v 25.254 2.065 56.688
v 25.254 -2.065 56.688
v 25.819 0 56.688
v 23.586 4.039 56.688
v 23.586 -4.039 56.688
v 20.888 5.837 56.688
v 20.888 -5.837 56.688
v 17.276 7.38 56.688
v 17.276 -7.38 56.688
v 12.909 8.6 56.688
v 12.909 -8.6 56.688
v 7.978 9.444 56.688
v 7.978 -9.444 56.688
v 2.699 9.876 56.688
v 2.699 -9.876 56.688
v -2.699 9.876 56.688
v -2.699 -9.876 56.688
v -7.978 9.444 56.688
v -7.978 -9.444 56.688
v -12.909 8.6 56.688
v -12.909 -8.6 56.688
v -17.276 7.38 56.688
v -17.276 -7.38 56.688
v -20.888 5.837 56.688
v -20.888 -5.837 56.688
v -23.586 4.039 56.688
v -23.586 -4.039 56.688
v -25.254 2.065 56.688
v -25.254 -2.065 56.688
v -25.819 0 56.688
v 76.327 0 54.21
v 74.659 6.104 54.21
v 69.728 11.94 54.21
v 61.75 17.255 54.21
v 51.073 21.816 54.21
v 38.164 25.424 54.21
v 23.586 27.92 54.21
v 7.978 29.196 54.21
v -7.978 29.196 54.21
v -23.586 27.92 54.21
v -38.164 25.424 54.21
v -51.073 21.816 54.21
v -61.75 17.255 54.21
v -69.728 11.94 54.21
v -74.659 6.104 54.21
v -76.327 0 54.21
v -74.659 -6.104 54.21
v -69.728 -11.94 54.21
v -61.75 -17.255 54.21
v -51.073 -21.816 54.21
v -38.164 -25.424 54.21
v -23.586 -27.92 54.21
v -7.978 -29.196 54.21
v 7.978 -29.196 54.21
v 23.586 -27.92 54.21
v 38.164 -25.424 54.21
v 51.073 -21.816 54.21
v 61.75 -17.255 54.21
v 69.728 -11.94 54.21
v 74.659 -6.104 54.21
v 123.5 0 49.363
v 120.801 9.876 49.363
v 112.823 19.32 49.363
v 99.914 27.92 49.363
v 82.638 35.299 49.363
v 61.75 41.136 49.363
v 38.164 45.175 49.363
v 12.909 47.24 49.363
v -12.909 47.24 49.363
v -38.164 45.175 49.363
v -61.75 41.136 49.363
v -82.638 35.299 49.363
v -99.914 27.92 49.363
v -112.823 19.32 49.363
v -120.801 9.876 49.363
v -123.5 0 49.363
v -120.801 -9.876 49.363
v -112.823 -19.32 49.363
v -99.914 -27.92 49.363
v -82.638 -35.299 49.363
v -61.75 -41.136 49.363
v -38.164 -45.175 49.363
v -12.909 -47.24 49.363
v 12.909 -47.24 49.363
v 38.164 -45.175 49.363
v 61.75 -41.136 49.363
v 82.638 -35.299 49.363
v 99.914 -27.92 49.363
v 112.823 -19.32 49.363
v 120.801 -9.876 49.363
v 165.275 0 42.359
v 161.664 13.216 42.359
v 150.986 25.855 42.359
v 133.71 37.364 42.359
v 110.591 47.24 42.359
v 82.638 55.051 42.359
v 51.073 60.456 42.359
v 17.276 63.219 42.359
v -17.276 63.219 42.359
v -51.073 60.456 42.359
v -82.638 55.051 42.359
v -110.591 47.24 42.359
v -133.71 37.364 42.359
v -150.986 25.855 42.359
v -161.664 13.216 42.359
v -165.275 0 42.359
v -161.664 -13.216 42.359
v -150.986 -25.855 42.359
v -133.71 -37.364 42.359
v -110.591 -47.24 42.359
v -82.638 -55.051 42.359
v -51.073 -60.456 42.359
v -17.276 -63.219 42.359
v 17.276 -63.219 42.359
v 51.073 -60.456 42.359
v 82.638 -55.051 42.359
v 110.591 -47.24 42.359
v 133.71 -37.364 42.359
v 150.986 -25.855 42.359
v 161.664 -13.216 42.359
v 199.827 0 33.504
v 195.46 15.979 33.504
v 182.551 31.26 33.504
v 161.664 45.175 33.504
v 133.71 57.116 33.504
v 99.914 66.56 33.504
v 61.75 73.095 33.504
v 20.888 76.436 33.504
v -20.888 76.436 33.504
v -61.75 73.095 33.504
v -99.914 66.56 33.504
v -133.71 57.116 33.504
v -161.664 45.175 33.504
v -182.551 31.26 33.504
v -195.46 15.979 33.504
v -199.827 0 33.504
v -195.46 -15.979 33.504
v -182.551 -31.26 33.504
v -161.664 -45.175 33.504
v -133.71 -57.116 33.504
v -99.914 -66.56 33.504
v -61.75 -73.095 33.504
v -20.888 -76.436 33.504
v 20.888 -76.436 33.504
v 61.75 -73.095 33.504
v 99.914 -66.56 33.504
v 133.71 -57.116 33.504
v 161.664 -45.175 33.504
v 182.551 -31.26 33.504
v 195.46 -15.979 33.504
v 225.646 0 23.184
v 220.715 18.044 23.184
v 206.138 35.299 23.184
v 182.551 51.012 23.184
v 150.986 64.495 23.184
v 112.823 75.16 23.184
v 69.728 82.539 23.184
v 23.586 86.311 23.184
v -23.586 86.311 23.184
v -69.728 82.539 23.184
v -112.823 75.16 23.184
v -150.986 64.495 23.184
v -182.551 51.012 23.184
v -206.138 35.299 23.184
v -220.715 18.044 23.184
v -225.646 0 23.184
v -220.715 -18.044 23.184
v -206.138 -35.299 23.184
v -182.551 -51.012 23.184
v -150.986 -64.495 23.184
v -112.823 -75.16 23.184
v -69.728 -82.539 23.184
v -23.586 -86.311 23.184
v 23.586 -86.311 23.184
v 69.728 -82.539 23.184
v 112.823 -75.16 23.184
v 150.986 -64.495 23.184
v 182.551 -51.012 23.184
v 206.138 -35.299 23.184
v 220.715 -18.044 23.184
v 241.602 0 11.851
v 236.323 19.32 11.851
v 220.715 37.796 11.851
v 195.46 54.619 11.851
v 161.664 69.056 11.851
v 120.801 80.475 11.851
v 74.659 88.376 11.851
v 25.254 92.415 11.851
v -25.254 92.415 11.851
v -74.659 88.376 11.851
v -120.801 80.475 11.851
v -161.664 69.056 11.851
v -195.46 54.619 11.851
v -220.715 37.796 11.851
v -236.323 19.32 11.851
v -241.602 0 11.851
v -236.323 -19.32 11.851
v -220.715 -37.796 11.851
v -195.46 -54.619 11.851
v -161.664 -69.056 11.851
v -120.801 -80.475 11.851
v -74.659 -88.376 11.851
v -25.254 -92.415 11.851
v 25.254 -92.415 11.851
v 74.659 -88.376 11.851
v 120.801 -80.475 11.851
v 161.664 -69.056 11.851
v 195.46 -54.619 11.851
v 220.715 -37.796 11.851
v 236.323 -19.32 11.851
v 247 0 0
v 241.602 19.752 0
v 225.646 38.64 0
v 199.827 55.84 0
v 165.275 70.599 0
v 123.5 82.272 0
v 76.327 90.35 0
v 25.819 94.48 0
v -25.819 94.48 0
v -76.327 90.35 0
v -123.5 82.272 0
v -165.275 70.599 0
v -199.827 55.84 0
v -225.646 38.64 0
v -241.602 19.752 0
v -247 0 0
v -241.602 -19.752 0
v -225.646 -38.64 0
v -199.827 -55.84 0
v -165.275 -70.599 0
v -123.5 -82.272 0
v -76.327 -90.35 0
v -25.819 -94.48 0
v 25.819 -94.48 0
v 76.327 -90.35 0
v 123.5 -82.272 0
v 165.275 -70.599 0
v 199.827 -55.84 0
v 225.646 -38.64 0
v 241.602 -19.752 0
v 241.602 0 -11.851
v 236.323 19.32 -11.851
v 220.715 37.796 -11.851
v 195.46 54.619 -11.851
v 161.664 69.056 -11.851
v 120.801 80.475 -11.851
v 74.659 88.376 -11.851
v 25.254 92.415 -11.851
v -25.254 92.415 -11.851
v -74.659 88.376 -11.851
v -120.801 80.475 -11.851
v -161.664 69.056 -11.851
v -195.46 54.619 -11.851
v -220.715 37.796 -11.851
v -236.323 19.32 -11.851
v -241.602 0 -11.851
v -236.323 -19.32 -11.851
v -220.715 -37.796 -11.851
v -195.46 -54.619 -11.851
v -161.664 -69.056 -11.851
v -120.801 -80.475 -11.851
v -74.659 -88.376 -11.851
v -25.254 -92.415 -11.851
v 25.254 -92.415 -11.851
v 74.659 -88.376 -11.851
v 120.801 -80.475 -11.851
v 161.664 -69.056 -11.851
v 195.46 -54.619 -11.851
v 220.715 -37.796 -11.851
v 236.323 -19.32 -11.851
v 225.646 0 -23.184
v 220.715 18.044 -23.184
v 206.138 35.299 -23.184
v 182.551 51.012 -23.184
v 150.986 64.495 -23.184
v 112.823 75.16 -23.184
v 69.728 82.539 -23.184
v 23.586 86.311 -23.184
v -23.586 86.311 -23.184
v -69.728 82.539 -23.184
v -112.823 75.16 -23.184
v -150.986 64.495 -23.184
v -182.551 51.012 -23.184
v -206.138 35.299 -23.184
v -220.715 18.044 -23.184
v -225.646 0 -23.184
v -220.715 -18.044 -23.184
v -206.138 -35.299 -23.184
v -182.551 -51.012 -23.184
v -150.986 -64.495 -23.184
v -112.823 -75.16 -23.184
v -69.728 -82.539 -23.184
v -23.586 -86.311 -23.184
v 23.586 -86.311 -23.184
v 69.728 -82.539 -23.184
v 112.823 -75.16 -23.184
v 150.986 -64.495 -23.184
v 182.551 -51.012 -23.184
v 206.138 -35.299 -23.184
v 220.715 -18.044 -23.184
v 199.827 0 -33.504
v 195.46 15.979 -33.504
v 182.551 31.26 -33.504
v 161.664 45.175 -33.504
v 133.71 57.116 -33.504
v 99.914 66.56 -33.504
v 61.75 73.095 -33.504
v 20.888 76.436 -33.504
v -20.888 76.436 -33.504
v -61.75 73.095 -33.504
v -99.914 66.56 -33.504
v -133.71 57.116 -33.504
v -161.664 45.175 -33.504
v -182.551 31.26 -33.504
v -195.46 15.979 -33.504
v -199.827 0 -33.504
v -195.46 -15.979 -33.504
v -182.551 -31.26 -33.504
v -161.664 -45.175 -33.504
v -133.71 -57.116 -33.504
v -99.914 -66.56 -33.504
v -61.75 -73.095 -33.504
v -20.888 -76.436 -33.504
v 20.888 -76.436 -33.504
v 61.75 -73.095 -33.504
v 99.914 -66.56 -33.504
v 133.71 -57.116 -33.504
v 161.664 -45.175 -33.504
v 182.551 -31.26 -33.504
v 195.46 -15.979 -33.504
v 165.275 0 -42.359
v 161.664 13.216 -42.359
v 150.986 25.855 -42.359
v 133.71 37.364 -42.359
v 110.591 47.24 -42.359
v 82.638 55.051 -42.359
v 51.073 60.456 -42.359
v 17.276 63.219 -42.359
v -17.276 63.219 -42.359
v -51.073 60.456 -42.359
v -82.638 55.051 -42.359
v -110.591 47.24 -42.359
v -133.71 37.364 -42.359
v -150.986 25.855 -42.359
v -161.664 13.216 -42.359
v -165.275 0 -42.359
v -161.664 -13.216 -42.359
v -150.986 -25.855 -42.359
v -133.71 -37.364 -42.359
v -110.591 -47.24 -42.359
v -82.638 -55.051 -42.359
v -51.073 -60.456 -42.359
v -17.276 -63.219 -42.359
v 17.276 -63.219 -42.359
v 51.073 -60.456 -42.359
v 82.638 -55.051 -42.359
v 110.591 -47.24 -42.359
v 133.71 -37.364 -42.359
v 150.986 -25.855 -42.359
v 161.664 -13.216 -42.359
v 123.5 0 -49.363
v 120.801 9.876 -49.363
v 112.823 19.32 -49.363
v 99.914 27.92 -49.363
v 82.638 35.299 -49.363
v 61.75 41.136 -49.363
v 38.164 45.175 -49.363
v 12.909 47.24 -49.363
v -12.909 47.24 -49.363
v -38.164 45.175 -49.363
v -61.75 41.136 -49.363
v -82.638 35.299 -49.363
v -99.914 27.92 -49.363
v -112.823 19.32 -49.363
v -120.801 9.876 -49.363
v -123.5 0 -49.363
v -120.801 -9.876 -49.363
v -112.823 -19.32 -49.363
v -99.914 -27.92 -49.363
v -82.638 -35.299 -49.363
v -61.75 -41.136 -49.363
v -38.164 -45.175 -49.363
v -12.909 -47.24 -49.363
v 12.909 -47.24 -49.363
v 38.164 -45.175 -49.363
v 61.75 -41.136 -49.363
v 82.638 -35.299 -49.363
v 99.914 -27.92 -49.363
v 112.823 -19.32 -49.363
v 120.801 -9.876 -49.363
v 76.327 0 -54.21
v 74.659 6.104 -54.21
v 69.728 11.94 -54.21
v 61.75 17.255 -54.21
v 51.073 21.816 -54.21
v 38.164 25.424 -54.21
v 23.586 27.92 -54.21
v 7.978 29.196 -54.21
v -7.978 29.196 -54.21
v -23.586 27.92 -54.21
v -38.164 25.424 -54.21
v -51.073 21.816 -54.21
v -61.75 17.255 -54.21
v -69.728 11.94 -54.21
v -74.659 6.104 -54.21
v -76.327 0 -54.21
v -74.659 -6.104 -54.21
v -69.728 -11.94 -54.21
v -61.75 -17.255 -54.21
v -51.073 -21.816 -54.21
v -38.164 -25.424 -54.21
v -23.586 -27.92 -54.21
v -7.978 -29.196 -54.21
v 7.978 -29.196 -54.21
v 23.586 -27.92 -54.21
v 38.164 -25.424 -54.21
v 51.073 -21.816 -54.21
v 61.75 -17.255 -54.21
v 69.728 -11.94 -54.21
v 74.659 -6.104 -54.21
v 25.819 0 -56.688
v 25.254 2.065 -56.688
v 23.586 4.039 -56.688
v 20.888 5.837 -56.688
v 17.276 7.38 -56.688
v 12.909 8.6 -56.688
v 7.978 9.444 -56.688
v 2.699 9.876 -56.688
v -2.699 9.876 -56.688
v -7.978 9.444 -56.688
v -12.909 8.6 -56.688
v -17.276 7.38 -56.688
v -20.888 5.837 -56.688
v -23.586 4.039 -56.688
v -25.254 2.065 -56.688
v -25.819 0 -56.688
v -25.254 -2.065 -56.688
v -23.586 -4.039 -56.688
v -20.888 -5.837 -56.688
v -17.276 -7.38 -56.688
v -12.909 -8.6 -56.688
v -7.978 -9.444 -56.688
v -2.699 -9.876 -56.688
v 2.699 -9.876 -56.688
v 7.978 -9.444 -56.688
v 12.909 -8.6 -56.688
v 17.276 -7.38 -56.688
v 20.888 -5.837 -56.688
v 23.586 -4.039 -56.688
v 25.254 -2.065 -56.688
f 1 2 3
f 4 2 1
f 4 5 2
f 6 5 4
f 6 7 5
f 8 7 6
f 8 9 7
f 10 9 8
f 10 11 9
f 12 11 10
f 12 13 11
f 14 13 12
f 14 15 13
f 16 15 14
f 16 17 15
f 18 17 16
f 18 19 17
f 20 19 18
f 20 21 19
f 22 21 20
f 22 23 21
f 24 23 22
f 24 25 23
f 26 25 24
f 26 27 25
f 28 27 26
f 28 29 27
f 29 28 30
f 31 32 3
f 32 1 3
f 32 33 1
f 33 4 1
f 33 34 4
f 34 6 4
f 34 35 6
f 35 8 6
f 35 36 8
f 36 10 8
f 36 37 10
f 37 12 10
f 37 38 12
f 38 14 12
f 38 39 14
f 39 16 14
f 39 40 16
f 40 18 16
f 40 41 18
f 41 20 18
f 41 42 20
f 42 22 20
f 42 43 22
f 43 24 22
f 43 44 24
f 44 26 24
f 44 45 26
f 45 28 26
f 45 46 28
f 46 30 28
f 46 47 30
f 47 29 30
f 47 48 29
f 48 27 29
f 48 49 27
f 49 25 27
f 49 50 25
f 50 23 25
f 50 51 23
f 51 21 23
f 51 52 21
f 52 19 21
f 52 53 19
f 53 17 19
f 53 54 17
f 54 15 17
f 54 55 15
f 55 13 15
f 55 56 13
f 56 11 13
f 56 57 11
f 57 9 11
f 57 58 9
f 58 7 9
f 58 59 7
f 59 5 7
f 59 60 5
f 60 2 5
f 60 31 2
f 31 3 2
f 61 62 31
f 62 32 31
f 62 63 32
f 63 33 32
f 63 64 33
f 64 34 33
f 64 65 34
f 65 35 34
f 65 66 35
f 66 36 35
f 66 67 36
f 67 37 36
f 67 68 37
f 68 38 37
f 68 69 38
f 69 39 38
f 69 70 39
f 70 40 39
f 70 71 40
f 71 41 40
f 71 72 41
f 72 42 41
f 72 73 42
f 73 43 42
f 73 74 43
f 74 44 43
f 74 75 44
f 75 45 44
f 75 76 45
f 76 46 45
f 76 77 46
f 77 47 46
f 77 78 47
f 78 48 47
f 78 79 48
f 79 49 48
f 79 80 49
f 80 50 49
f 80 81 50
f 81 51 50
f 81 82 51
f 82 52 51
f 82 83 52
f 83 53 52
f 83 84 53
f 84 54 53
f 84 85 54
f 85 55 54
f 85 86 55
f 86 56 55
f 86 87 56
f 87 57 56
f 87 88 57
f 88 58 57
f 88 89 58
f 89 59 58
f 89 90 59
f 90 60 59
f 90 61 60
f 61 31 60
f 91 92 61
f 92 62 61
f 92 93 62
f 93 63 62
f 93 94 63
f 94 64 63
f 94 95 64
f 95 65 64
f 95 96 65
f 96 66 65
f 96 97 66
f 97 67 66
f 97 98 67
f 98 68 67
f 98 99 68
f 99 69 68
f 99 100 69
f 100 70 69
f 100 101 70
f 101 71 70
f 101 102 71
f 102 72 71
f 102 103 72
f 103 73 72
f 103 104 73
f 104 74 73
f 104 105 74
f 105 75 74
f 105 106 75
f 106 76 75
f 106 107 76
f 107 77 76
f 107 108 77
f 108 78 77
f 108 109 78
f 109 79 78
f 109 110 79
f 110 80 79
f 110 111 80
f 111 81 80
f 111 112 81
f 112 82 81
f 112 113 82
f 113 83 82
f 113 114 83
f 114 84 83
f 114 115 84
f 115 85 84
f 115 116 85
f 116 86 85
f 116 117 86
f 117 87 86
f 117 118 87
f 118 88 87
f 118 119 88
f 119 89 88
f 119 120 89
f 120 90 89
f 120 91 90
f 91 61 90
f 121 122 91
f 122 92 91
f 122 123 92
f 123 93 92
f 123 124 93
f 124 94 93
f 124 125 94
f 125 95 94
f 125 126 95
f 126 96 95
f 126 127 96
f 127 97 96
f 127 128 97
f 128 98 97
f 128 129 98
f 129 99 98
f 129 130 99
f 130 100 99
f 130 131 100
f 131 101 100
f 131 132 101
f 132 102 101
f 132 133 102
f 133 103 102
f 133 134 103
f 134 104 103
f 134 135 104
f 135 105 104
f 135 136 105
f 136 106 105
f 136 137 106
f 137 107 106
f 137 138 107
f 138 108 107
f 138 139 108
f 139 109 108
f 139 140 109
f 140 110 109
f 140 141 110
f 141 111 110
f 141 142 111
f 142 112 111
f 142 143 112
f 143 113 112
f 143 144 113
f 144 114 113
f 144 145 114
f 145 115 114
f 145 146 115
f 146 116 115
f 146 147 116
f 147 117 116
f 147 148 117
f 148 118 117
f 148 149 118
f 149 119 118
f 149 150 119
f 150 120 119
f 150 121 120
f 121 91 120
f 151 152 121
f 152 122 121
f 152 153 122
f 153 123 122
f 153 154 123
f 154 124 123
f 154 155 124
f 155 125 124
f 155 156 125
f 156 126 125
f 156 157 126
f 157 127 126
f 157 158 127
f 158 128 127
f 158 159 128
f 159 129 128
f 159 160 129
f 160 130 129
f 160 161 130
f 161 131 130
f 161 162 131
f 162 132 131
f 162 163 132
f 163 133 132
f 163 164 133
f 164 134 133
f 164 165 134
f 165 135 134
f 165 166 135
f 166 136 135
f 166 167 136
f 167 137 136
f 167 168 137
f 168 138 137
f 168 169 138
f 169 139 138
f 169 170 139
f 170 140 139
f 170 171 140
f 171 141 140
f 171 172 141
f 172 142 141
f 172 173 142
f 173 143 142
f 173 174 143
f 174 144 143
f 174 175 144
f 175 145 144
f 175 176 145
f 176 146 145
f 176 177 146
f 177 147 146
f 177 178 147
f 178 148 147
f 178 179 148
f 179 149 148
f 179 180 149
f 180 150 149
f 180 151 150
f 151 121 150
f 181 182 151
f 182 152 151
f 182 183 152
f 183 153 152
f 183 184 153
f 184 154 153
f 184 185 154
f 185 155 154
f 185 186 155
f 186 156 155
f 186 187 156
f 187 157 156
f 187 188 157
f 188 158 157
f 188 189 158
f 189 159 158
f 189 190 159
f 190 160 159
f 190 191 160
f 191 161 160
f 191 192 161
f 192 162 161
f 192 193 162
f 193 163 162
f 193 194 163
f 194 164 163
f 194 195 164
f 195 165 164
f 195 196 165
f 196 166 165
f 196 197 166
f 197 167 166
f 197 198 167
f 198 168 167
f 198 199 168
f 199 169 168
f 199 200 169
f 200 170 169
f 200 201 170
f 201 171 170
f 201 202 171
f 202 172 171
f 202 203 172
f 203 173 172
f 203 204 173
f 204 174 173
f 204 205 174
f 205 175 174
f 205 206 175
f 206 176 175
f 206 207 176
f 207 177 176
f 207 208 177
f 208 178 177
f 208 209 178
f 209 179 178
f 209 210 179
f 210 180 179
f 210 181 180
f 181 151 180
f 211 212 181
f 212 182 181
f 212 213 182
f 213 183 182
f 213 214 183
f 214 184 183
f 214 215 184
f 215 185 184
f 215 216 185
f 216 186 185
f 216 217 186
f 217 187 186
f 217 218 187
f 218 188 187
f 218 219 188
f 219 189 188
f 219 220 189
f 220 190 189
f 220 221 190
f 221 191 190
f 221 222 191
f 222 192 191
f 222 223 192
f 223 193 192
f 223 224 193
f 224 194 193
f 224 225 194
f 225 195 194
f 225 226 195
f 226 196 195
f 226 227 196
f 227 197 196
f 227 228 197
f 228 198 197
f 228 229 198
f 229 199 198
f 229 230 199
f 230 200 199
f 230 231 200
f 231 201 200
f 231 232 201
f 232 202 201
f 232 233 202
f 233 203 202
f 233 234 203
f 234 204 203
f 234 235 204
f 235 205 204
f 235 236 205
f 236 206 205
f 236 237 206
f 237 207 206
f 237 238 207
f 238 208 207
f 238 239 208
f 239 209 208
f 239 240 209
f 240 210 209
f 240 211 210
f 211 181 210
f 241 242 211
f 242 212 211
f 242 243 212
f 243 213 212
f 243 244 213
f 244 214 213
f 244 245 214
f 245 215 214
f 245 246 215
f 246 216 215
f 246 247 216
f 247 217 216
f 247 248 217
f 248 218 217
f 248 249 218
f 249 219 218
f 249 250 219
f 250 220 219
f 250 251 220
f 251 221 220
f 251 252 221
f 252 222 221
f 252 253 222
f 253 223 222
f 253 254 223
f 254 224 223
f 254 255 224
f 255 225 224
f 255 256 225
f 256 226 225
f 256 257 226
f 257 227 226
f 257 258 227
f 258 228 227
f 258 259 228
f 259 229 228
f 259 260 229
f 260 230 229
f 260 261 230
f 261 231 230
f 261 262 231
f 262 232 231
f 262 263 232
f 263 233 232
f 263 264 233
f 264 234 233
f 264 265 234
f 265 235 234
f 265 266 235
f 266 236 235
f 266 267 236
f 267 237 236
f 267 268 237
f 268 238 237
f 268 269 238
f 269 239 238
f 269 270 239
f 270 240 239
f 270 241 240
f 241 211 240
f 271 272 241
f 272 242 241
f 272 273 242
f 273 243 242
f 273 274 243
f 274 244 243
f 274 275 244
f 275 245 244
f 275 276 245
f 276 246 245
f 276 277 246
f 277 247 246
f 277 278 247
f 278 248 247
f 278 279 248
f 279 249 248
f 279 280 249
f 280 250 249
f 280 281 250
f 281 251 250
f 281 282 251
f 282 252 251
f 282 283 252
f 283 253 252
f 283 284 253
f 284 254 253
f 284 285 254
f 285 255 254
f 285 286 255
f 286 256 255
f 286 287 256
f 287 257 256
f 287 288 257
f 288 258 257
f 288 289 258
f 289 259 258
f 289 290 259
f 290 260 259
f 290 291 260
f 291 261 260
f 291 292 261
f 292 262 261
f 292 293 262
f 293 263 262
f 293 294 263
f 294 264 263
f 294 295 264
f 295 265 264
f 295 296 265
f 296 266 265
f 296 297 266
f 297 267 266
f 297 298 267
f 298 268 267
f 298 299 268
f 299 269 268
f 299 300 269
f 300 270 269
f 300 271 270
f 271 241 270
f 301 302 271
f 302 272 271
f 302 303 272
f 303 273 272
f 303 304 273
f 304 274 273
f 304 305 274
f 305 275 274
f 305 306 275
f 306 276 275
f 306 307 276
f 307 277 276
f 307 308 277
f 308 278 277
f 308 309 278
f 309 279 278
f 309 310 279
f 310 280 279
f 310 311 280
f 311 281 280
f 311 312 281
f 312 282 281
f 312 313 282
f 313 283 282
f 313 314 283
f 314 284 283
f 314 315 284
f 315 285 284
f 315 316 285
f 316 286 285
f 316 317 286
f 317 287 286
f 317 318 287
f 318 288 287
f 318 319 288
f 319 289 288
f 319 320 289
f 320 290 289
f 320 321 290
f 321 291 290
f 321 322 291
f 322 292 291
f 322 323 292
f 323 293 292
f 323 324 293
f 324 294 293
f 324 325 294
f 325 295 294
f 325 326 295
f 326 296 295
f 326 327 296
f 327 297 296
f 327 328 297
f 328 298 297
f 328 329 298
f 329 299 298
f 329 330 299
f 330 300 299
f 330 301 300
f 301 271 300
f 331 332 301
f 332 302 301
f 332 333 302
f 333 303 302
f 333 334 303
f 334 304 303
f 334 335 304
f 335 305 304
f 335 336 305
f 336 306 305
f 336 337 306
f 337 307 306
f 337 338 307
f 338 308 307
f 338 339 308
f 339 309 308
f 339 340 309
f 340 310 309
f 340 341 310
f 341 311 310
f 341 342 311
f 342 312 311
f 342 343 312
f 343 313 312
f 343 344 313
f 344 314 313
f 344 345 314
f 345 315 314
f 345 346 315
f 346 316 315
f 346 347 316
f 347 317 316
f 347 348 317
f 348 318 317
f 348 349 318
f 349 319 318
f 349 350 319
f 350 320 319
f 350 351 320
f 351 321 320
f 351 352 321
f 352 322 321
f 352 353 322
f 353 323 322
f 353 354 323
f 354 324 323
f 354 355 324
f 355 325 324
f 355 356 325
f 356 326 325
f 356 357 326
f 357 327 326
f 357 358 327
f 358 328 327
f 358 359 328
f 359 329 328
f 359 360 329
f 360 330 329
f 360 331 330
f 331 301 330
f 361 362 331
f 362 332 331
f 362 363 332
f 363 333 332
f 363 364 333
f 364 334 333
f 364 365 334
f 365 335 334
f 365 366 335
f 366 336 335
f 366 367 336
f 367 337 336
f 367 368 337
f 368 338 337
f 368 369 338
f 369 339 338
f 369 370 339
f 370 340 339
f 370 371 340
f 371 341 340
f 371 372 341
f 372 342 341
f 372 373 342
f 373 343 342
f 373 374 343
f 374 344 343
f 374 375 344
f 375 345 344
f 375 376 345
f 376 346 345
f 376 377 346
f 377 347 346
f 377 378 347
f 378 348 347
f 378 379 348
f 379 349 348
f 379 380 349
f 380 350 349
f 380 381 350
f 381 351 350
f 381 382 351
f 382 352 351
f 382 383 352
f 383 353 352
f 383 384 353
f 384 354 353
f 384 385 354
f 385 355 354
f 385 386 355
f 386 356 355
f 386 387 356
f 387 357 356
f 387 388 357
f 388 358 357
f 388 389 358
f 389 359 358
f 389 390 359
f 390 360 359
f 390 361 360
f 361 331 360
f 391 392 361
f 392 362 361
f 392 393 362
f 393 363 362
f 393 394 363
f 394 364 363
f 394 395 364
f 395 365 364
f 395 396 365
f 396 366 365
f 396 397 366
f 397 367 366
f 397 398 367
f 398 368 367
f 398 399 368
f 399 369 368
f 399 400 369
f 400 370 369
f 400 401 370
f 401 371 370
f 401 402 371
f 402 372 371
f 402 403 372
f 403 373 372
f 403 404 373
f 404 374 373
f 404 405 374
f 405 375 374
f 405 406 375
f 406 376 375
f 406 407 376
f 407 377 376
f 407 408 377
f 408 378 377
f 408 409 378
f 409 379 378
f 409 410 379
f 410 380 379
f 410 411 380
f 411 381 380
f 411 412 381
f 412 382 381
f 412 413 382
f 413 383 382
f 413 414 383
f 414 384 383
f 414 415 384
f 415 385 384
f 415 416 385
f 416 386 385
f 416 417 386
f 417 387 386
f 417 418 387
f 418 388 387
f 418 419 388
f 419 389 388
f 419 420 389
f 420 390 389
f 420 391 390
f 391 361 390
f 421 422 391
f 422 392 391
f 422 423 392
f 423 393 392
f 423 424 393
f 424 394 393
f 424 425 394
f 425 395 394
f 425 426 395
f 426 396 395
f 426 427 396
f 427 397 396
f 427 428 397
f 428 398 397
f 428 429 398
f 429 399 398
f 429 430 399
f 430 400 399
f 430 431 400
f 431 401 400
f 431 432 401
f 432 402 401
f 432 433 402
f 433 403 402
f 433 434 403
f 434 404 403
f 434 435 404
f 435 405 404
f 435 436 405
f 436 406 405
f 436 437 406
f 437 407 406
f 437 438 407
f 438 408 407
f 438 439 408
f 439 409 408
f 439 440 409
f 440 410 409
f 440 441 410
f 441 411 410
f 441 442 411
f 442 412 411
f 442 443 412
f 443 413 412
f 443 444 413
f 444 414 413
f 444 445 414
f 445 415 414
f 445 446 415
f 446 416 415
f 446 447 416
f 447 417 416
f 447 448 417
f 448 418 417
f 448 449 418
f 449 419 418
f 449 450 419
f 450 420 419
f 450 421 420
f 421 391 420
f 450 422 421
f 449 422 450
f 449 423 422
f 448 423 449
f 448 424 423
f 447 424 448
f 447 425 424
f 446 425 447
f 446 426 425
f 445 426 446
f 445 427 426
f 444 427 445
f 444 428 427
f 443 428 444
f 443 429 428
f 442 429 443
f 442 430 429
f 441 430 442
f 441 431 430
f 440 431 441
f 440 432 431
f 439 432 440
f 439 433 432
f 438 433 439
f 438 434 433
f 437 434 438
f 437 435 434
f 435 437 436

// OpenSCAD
// Generated by SolidPython 1.0.1 on 2020-07-29 00:46:50


scale(v = [13, 5, 3]) {
	sphere(r = 19);
}
/***********************************************
*********      SolidPython code:      **********
************************************************
 
# import packages: SolidPython
from solid import *
from solid.utils import *
from itertools import chain, combinations, permutations


class Resize:

    def __init__(self, scad_file):
        self.scad_file = scad_file
        #self.scad_file = import_scad(scad_file)
        # cone/cylinder param:
        self.r1 = 0
        self.r2 = 0
        self.h = 0
        # rectangular prism param:
        self.w = 0
        self.l = 0
        # ellipse param:
        self.r = 0

    # import OpenScad code (file name corresponds to shape)


    # classify shape + parameters
    def assign(self, param1, param2, param3):
        if self.scad_file == 'cone.scad':
            self.r1 = param1
            self.r2 = param2
            self.h = param3
        elif self.scad_file == 'cylinder.scad':
            self.r1 = param1
            self.r2 = param2
            self.h = param3
        elif self.scad_file == 'rectangularPrism.scad':
            self.h = param1
            self.l = param2
            self.w = param3
        else:
            self.r = param1
            self.h = param2

    # resize parameters
    def iterate(self):
        x = range(3, 20, 2)
        i = 1
        if self.scad_file == 'cone.scad':
            tempList = list(permutations(x, 2))
            for temp in tempList:
                param1 = temp[0]
                param2 = temp[1]
                filepath = 'produced_scad_files/' + 'cone' + str(param1) + '_' + str(param2) + '_' + '.scad'
                scad_render_to_file(cylinder(h=param1, r1=param2, r2=0), filepath)

        elif self.scad_file == 'cylinder.scad':
            tempList = list(permutations(x, 3))
            for temp in tempList:
                param1 = temp[0]
                param2 = temp[1]
                filepath = 'produced_scad_files/' + 'cylinder' + str(param1) + '_' + str(param2) + '_' + '.scad'
                scad_render_to_file(cylinder(h=param1, r1=param2, r2=param2), filepath)

        elif self.scad_file == 'rectangularPrism.scad':
            tempList = list(permutations(x, 3))
            for temp in tempList:
                param1 = temp[0]
                param2 = temp[1]
                param3 = temp[2]
                filepath = 'produced_scad_files/' + 'rectangularPrism' + str(param1) + '_' + str(param2) + '_' + str(
                    param3) + '.scad'
                scad_render_to_file(cube(size=(param1, param2, param3)), filepath)

        elif self.scad_file == 'ellipse.scad':
            tempList = list(permutations(x, 4))
            for temp in tempList:
                param1 = temp[0]
                param2 = temp[1]
                param3 = temp[2]
                param4 = temp[3]
                filepath = 'produced_scad_files/' + 'ellipse' + str(param1) + '_' + str(param2) + '_' + str(param3) + '_' + str(param4) + '.scad'
                scad_render_to_file(scale([param1, param2, param3])(sphere(r=param4)), filepath)

    def render_to_scadfile(self):
        scad_render_to_file(scad, 'example.scad') 
 
************************************************/
